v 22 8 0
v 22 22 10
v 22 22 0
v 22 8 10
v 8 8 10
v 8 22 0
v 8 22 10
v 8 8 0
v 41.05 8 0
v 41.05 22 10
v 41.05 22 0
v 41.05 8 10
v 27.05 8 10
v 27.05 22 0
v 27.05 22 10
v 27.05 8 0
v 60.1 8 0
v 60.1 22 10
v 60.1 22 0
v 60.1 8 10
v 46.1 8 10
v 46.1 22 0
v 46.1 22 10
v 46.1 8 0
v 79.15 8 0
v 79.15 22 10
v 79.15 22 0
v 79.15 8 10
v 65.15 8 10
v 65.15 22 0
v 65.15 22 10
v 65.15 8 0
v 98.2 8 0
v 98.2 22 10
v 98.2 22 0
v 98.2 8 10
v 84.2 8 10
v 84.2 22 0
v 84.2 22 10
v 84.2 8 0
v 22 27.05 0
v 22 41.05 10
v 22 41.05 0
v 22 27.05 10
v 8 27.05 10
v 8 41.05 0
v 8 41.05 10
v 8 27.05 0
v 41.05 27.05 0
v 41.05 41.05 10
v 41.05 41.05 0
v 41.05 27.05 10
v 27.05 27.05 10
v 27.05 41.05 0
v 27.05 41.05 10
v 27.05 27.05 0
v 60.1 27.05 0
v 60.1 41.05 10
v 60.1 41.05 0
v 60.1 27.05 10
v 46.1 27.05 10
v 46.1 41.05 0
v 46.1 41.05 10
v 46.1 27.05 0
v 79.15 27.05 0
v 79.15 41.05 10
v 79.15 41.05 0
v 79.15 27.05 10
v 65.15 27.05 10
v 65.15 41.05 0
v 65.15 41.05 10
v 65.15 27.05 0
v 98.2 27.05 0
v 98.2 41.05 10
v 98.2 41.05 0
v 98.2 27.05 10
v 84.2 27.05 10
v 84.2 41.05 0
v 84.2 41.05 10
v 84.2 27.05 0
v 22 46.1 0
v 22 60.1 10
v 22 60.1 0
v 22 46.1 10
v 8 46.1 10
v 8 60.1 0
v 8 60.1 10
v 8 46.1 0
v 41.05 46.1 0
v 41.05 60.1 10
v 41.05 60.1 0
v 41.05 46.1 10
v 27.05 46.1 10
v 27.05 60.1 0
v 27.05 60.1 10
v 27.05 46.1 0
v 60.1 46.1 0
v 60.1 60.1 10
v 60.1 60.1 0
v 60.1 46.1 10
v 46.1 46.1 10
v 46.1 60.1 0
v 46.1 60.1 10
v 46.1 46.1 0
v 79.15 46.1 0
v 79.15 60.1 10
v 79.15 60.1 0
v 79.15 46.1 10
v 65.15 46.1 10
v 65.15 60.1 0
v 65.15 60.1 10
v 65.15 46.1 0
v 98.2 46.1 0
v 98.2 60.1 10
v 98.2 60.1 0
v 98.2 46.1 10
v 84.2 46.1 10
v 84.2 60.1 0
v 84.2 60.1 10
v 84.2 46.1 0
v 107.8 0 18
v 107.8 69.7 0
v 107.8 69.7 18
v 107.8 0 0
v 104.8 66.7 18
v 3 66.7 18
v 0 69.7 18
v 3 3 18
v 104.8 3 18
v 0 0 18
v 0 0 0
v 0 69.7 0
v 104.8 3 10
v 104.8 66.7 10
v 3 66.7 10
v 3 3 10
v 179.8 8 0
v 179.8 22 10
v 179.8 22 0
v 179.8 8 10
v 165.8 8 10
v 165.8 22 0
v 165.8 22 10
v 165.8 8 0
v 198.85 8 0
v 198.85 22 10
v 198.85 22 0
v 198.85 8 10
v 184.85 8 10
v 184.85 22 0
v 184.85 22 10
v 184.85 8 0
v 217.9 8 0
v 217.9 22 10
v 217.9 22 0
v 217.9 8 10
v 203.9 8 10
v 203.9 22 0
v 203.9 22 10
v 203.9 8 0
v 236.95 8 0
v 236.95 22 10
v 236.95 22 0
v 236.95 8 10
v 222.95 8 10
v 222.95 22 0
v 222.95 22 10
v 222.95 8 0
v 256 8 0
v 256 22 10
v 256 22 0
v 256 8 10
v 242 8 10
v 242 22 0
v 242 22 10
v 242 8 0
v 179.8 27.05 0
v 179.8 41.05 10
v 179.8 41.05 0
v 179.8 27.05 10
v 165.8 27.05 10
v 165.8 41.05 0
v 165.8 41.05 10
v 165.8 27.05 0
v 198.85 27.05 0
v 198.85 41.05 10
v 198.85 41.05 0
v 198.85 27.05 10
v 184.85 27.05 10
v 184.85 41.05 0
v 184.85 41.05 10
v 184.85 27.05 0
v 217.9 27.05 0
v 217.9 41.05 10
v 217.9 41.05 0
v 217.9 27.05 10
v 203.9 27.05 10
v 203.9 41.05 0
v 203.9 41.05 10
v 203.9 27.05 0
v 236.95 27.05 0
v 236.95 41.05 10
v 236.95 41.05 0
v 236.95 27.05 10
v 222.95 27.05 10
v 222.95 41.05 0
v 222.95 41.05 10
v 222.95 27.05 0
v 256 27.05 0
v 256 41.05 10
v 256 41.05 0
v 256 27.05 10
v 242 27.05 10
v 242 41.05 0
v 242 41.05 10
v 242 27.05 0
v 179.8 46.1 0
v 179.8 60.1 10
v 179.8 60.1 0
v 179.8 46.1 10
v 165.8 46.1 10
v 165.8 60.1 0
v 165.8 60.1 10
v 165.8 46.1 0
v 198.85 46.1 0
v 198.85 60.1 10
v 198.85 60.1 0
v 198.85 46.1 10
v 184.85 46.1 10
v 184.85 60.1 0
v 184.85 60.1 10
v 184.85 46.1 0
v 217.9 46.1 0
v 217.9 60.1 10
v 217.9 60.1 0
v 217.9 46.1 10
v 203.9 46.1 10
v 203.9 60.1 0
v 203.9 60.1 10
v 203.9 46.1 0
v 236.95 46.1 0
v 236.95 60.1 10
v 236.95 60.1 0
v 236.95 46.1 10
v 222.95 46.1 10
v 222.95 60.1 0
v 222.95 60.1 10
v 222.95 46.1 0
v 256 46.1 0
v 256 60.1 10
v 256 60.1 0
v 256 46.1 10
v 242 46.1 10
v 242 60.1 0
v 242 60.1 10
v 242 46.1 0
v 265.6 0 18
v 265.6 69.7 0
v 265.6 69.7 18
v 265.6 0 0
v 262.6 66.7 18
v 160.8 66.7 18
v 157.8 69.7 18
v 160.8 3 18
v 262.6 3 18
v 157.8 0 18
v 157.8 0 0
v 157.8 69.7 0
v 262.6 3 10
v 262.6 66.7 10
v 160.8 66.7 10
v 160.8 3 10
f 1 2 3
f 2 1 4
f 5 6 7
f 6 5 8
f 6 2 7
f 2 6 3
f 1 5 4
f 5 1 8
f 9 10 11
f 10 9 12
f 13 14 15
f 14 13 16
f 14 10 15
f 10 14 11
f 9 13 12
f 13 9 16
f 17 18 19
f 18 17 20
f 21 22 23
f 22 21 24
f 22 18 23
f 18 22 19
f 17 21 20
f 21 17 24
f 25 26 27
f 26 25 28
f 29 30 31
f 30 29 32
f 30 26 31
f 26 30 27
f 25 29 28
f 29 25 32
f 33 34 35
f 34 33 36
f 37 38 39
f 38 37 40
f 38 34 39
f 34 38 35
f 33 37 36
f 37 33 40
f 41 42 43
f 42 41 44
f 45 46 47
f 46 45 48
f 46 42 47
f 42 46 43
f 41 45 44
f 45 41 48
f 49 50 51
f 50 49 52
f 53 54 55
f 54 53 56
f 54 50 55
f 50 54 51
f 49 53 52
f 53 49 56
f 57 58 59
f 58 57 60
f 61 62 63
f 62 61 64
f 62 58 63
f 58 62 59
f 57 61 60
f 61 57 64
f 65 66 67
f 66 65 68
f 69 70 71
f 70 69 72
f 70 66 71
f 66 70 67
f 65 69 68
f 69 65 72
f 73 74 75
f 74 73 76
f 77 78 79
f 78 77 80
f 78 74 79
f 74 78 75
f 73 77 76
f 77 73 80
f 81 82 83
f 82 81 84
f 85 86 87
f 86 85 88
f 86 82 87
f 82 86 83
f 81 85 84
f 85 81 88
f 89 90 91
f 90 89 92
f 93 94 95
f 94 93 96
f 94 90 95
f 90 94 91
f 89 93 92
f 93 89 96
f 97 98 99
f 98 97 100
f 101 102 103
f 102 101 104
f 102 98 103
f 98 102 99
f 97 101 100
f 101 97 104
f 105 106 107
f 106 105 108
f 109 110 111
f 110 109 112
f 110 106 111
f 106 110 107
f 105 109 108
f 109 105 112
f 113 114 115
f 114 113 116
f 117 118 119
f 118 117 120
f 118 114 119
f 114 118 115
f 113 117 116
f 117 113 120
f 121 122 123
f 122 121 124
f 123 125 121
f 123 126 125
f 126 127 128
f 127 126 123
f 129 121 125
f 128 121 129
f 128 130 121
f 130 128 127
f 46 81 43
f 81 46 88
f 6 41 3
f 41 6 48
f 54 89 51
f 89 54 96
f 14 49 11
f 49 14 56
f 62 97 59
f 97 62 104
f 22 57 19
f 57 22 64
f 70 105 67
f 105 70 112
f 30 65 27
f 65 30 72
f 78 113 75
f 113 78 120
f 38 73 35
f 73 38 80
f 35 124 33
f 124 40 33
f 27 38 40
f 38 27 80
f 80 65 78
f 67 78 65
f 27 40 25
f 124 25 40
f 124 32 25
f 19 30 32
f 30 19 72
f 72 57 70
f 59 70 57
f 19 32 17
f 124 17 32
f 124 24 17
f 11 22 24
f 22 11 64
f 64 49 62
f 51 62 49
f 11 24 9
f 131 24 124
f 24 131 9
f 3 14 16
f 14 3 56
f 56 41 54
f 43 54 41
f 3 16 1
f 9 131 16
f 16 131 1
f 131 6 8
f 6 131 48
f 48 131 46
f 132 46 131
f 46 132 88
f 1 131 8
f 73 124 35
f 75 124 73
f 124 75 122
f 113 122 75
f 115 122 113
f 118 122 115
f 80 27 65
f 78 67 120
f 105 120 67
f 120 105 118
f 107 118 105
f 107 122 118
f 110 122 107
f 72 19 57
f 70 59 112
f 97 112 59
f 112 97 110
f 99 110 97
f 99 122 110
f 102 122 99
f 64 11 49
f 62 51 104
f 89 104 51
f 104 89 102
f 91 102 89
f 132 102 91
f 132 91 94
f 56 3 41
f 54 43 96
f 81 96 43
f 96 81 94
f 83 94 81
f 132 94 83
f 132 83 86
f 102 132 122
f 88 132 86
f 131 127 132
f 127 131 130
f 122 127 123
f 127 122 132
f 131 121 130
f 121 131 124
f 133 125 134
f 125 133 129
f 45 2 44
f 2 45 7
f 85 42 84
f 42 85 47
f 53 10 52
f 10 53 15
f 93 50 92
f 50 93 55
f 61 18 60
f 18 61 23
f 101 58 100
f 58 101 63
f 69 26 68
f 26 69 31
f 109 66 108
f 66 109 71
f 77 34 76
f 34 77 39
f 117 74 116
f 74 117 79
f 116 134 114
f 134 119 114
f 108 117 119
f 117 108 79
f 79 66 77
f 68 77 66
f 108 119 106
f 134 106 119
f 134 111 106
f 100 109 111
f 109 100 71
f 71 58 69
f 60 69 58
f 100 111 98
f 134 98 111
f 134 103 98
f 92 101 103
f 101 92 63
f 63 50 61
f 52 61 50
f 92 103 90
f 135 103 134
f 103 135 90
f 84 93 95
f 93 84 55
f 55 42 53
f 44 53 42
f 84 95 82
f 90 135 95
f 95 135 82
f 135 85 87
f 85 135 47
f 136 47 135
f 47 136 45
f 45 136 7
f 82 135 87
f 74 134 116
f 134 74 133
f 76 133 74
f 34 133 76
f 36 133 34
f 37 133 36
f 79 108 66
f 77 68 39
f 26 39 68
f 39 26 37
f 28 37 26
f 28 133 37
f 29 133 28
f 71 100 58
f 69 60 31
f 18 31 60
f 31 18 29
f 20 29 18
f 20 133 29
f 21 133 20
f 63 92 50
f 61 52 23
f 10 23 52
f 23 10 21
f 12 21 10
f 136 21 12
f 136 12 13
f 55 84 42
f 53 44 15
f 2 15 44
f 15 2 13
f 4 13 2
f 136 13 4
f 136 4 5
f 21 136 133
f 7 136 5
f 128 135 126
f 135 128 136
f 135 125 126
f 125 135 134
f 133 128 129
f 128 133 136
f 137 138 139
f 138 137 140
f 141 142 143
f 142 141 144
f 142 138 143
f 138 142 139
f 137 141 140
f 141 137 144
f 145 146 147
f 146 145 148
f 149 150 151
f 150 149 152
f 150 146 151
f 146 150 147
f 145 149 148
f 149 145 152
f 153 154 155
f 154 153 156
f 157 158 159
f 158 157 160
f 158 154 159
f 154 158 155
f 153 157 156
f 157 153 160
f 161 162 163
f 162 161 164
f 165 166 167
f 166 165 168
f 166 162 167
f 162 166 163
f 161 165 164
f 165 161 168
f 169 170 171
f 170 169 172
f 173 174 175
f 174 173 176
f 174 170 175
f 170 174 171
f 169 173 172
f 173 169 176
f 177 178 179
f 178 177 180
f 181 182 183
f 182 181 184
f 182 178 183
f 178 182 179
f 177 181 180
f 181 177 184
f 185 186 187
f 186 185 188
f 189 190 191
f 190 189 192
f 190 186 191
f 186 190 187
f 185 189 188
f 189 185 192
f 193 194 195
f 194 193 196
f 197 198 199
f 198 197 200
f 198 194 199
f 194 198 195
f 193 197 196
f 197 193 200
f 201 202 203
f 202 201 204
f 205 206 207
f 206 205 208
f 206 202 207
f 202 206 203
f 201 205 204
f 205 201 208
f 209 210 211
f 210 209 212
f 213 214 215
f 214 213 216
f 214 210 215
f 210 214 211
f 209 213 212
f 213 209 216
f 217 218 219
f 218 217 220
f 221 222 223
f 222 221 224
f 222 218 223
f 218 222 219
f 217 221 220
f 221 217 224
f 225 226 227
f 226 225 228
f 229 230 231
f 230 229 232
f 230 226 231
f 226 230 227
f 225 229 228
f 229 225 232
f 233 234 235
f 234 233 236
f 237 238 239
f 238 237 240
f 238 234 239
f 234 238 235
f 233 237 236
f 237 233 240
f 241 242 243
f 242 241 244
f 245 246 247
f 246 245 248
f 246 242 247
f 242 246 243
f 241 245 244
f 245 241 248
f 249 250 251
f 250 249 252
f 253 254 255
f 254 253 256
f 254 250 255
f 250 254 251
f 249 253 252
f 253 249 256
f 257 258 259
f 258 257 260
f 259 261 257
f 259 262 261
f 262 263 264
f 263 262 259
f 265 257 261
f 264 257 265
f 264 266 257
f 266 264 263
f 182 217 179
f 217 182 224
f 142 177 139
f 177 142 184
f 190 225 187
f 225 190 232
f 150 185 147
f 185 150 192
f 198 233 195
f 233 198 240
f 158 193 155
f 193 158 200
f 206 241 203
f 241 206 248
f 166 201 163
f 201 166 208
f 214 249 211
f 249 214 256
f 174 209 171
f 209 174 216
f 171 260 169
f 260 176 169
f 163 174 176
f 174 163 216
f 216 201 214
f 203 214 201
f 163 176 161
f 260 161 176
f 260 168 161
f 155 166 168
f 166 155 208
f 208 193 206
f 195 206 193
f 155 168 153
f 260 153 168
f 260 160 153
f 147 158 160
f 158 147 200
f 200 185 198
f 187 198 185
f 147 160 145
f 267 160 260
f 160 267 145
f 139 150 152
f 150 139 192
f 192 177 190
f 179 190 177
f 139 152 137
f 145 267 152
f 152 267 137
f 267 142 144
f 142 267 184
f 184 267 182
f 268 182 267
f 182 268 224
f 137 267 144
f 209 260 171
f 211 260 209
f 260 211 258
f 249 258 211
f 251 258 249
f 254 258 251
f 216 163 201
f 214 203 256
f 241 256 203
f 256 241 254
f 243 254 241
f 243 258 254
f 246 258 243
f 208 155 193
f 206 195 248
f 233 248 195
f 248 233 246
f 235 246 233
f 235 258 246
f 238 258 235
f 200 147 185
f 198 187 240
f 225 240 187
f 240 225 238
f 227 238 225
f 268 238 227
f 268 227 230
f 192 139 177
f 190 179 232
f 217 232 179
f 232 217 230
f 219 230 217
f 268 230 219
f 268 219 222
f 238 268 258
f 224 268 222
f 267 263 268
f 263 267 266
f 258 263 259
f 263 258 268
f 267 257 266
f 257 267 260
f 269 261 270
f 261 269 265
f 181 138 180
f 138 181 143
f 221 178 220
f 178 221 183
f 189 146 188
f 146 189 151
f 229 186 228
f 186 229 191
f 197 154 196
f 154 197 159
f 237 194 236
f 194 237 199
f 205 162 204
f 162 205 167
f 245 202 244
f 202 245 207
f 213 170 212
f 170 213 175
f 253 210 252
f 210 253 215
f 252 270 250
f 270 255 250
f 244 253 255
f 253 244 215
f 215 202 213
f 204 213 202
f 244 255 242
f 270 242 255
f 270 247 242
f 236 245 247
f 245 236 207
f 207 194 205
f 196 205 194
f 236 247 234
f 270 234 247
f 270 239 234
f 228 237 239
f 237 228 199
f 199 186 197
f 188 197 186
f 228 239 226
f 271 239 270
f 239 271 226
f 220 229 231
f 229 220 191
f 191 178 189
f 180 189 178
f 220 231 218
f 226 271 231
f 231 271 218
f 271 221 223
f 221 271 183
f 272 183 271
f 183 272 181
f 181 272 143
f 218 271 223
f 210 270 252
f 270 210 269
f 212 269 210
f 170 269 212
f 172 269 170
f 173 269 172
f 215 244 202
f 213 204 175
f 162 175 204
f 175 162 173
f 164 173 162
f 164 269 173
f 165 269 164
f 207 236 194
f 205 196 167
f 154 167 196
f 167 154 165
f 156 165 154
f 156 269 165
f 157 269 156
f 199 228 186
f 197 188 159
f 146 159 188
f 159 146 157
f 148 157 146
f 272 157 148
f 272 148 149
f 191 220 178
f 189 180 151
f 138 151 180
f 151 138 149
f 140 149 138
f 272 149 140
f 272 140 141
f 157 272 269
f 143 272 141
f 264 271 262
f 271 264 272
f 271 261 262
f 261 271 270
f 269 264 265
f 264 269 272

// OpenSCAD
// Generated keyboard case - Separate halves
// Layout: Custom (30 keys total)
// Switch type: Cherry MX
// Split keyboard: separate halves
// Optimization: render

// Parameters
left_case_width = 107.80;
left_case_height = 69.70;
right_case_width = 107.80;
right_case_height = 69.70;
case_depth = 18.00;
wall_thickness = 3.00;
base_height = 10.00;
switch_cutout_size = 14.00;
separation = 50;  // Distance between halves for visualization

module left_half() {
    difference() {
        // Outer shell
        cube([left_case_width, left_case_height, case_depth]);

        // Inner cavity
        translate([wall_thickness, wall_thickness, base_height])
            cube([left_case_width - 2*wall_thickness, 
                  left_case_height - 2*wall_thickness, 
                  case_depth - base_height + 1]);

        // Switch cutouts
        translate([wall_thickness + 5 - 0.00, wall_thickness + 5 - 0.00, -1])
            render() left_switch_plate();
    }
}

module right_half() {
    difference() {
        // Outer shell
        cube([right_case_width, right_case_height, case_depth]);

        // Inner cavity
        translate([wall_thickness, wall_thickness, base_height])
            cube([right_case_width - 2*wall_thickness, 
                  right_case_height - 2*wall_thickness, 
                  case_depth - base_height + 1]);

        // Switch cutouts
        translate([wall_thickness + 5 - 0.00, wall_thickness + 5 - 0.00, -1])
            render() right_switch_plate();
    }
}

module left_switch_plate() {
    translate([0.00, 0.00, 0])
        cube([switch_cutout_size, switch_cutout_size, base_height + 2]);
    translate([19.05, 0.00, 0])
        cube([switch_cutout_size, switch_cutout_size, base_height + 2]);
    translate([38.10, 0.00, 0])
        cube([switch_cutout_size, switch_cutout_size, base_height + 2]);
    translate([57.15, 0.00, 0])
        cube([switch_cutout_size, switch_cutout_size, base_height + 2]);
    translate([76.20, 0.00, 0])
        cube([switch_cutout_size, switch_cutout_size, base_height + 2]);
    translate([0.00, 19.05, 0])
        cube([switch_cutout_size, switch_cutout_size, base_height + 2]);
    translate([19.05, 19.05, 0])
        cube([switch_cutout_size, switch_cutout_size, base_height + 2]);
    translate([38.10, 19.05, 0])
        cube([switch_cutout_size, switch_cutout_size, base_height + 2]);
    translate([57.15, 19.05, 0])
        cube([switch_cutout_size, switch_cutout_size, base_height + 2]);
    translate([76.20, 19.05, 0])
        cube([switch_cutout_size, switch_cutout_size, base_height + 2]);
    translate([0.00, 38.10, 0])
        cube([switch_cutout_size, switch_cutout_size, base_height + 2]);
    translate([19.05, 38.10, 0])
        cube([switch_cutout_size, switch_cutout_size, base_height + 2]);
    translate([38.10, 38.10, 0])
        cube([switch_cutout_size, switch_cutout_size, base_height + 2]);
    translate([57.15, 38.10, 0])
        cube([switch_cutout_size, switch_cutout_size, base_height + 2]);
    translate([76.20, 38.10, 0])
        cube([switch_cutout_size, switch_cutout_size, base_height + 2]);
}

module right_switch_plate() {
    translate([0.00, 0.00, 0])
        cube([switch_cutout_size, switch_cutout_size, base_height + 2]);
    translate([19.05, 0.00, 0])
        cube([switch_cutout_size, switch_cutout_size, base_height + 2]);
    translate([38.10, 0.00, 0])
        cube([switch_cutout_size, switch_cutout_size, base_height + 2]);
    translate([57.15, 0.00, 0])
        cube([switch_cutout_size, switch_cutout_size, base_height + 2]);
    translate([76.20, 0.00, 0])
        cube([switch_cutout_size, switch_cutout_size, base_height + 2]);
    translate([0.00, 19.05, 0])
        cube([switch_cutout_size, switch_cutout_size, base_height + 2]);
    translate([19.05, 19.05, 0])
        cube([switch_cutout_size, switch_cutout_size, base_height + 2]);
    translate([38.10, 19.05, 0])
        cube([switch_cutout_size, switch_cutout_size, base_height + 2]);
    translate([57.15, 19.05, 0])
        cube([switch_cutout_size, switch_cutout_size, base_height + 2]);
    translate([76.20, 19.05, 0])
        cube([switch_cutout_size, switch_cutout_size, base_height + 2]);
    translate([0.00, 38.10, 0])
        cube([switch_cutout_size, switch_cutout_size, base_height + 2]);
    translate([19.05, 38.10, 0])
        cube([switch_cutout_size, switch_cutout_size, base_height + 2]);
    translate([38.10, 38.10, 0])
        cube([switch_cutout_size, switch_cutout_size, base_height + 2]);
    translate([57.15, 38.10, 0])
        cube([switch_cutout_size, switch_cutout_size, base_height + 2]);
    translate([76.20, 38.10, 0])
        cube([switch_cutout_size, switch_cutout_size, base_height + 2]);
}

// Generate both halves
left_half();
translate([left_case_width + separation, 0, 0])
    right_half();
